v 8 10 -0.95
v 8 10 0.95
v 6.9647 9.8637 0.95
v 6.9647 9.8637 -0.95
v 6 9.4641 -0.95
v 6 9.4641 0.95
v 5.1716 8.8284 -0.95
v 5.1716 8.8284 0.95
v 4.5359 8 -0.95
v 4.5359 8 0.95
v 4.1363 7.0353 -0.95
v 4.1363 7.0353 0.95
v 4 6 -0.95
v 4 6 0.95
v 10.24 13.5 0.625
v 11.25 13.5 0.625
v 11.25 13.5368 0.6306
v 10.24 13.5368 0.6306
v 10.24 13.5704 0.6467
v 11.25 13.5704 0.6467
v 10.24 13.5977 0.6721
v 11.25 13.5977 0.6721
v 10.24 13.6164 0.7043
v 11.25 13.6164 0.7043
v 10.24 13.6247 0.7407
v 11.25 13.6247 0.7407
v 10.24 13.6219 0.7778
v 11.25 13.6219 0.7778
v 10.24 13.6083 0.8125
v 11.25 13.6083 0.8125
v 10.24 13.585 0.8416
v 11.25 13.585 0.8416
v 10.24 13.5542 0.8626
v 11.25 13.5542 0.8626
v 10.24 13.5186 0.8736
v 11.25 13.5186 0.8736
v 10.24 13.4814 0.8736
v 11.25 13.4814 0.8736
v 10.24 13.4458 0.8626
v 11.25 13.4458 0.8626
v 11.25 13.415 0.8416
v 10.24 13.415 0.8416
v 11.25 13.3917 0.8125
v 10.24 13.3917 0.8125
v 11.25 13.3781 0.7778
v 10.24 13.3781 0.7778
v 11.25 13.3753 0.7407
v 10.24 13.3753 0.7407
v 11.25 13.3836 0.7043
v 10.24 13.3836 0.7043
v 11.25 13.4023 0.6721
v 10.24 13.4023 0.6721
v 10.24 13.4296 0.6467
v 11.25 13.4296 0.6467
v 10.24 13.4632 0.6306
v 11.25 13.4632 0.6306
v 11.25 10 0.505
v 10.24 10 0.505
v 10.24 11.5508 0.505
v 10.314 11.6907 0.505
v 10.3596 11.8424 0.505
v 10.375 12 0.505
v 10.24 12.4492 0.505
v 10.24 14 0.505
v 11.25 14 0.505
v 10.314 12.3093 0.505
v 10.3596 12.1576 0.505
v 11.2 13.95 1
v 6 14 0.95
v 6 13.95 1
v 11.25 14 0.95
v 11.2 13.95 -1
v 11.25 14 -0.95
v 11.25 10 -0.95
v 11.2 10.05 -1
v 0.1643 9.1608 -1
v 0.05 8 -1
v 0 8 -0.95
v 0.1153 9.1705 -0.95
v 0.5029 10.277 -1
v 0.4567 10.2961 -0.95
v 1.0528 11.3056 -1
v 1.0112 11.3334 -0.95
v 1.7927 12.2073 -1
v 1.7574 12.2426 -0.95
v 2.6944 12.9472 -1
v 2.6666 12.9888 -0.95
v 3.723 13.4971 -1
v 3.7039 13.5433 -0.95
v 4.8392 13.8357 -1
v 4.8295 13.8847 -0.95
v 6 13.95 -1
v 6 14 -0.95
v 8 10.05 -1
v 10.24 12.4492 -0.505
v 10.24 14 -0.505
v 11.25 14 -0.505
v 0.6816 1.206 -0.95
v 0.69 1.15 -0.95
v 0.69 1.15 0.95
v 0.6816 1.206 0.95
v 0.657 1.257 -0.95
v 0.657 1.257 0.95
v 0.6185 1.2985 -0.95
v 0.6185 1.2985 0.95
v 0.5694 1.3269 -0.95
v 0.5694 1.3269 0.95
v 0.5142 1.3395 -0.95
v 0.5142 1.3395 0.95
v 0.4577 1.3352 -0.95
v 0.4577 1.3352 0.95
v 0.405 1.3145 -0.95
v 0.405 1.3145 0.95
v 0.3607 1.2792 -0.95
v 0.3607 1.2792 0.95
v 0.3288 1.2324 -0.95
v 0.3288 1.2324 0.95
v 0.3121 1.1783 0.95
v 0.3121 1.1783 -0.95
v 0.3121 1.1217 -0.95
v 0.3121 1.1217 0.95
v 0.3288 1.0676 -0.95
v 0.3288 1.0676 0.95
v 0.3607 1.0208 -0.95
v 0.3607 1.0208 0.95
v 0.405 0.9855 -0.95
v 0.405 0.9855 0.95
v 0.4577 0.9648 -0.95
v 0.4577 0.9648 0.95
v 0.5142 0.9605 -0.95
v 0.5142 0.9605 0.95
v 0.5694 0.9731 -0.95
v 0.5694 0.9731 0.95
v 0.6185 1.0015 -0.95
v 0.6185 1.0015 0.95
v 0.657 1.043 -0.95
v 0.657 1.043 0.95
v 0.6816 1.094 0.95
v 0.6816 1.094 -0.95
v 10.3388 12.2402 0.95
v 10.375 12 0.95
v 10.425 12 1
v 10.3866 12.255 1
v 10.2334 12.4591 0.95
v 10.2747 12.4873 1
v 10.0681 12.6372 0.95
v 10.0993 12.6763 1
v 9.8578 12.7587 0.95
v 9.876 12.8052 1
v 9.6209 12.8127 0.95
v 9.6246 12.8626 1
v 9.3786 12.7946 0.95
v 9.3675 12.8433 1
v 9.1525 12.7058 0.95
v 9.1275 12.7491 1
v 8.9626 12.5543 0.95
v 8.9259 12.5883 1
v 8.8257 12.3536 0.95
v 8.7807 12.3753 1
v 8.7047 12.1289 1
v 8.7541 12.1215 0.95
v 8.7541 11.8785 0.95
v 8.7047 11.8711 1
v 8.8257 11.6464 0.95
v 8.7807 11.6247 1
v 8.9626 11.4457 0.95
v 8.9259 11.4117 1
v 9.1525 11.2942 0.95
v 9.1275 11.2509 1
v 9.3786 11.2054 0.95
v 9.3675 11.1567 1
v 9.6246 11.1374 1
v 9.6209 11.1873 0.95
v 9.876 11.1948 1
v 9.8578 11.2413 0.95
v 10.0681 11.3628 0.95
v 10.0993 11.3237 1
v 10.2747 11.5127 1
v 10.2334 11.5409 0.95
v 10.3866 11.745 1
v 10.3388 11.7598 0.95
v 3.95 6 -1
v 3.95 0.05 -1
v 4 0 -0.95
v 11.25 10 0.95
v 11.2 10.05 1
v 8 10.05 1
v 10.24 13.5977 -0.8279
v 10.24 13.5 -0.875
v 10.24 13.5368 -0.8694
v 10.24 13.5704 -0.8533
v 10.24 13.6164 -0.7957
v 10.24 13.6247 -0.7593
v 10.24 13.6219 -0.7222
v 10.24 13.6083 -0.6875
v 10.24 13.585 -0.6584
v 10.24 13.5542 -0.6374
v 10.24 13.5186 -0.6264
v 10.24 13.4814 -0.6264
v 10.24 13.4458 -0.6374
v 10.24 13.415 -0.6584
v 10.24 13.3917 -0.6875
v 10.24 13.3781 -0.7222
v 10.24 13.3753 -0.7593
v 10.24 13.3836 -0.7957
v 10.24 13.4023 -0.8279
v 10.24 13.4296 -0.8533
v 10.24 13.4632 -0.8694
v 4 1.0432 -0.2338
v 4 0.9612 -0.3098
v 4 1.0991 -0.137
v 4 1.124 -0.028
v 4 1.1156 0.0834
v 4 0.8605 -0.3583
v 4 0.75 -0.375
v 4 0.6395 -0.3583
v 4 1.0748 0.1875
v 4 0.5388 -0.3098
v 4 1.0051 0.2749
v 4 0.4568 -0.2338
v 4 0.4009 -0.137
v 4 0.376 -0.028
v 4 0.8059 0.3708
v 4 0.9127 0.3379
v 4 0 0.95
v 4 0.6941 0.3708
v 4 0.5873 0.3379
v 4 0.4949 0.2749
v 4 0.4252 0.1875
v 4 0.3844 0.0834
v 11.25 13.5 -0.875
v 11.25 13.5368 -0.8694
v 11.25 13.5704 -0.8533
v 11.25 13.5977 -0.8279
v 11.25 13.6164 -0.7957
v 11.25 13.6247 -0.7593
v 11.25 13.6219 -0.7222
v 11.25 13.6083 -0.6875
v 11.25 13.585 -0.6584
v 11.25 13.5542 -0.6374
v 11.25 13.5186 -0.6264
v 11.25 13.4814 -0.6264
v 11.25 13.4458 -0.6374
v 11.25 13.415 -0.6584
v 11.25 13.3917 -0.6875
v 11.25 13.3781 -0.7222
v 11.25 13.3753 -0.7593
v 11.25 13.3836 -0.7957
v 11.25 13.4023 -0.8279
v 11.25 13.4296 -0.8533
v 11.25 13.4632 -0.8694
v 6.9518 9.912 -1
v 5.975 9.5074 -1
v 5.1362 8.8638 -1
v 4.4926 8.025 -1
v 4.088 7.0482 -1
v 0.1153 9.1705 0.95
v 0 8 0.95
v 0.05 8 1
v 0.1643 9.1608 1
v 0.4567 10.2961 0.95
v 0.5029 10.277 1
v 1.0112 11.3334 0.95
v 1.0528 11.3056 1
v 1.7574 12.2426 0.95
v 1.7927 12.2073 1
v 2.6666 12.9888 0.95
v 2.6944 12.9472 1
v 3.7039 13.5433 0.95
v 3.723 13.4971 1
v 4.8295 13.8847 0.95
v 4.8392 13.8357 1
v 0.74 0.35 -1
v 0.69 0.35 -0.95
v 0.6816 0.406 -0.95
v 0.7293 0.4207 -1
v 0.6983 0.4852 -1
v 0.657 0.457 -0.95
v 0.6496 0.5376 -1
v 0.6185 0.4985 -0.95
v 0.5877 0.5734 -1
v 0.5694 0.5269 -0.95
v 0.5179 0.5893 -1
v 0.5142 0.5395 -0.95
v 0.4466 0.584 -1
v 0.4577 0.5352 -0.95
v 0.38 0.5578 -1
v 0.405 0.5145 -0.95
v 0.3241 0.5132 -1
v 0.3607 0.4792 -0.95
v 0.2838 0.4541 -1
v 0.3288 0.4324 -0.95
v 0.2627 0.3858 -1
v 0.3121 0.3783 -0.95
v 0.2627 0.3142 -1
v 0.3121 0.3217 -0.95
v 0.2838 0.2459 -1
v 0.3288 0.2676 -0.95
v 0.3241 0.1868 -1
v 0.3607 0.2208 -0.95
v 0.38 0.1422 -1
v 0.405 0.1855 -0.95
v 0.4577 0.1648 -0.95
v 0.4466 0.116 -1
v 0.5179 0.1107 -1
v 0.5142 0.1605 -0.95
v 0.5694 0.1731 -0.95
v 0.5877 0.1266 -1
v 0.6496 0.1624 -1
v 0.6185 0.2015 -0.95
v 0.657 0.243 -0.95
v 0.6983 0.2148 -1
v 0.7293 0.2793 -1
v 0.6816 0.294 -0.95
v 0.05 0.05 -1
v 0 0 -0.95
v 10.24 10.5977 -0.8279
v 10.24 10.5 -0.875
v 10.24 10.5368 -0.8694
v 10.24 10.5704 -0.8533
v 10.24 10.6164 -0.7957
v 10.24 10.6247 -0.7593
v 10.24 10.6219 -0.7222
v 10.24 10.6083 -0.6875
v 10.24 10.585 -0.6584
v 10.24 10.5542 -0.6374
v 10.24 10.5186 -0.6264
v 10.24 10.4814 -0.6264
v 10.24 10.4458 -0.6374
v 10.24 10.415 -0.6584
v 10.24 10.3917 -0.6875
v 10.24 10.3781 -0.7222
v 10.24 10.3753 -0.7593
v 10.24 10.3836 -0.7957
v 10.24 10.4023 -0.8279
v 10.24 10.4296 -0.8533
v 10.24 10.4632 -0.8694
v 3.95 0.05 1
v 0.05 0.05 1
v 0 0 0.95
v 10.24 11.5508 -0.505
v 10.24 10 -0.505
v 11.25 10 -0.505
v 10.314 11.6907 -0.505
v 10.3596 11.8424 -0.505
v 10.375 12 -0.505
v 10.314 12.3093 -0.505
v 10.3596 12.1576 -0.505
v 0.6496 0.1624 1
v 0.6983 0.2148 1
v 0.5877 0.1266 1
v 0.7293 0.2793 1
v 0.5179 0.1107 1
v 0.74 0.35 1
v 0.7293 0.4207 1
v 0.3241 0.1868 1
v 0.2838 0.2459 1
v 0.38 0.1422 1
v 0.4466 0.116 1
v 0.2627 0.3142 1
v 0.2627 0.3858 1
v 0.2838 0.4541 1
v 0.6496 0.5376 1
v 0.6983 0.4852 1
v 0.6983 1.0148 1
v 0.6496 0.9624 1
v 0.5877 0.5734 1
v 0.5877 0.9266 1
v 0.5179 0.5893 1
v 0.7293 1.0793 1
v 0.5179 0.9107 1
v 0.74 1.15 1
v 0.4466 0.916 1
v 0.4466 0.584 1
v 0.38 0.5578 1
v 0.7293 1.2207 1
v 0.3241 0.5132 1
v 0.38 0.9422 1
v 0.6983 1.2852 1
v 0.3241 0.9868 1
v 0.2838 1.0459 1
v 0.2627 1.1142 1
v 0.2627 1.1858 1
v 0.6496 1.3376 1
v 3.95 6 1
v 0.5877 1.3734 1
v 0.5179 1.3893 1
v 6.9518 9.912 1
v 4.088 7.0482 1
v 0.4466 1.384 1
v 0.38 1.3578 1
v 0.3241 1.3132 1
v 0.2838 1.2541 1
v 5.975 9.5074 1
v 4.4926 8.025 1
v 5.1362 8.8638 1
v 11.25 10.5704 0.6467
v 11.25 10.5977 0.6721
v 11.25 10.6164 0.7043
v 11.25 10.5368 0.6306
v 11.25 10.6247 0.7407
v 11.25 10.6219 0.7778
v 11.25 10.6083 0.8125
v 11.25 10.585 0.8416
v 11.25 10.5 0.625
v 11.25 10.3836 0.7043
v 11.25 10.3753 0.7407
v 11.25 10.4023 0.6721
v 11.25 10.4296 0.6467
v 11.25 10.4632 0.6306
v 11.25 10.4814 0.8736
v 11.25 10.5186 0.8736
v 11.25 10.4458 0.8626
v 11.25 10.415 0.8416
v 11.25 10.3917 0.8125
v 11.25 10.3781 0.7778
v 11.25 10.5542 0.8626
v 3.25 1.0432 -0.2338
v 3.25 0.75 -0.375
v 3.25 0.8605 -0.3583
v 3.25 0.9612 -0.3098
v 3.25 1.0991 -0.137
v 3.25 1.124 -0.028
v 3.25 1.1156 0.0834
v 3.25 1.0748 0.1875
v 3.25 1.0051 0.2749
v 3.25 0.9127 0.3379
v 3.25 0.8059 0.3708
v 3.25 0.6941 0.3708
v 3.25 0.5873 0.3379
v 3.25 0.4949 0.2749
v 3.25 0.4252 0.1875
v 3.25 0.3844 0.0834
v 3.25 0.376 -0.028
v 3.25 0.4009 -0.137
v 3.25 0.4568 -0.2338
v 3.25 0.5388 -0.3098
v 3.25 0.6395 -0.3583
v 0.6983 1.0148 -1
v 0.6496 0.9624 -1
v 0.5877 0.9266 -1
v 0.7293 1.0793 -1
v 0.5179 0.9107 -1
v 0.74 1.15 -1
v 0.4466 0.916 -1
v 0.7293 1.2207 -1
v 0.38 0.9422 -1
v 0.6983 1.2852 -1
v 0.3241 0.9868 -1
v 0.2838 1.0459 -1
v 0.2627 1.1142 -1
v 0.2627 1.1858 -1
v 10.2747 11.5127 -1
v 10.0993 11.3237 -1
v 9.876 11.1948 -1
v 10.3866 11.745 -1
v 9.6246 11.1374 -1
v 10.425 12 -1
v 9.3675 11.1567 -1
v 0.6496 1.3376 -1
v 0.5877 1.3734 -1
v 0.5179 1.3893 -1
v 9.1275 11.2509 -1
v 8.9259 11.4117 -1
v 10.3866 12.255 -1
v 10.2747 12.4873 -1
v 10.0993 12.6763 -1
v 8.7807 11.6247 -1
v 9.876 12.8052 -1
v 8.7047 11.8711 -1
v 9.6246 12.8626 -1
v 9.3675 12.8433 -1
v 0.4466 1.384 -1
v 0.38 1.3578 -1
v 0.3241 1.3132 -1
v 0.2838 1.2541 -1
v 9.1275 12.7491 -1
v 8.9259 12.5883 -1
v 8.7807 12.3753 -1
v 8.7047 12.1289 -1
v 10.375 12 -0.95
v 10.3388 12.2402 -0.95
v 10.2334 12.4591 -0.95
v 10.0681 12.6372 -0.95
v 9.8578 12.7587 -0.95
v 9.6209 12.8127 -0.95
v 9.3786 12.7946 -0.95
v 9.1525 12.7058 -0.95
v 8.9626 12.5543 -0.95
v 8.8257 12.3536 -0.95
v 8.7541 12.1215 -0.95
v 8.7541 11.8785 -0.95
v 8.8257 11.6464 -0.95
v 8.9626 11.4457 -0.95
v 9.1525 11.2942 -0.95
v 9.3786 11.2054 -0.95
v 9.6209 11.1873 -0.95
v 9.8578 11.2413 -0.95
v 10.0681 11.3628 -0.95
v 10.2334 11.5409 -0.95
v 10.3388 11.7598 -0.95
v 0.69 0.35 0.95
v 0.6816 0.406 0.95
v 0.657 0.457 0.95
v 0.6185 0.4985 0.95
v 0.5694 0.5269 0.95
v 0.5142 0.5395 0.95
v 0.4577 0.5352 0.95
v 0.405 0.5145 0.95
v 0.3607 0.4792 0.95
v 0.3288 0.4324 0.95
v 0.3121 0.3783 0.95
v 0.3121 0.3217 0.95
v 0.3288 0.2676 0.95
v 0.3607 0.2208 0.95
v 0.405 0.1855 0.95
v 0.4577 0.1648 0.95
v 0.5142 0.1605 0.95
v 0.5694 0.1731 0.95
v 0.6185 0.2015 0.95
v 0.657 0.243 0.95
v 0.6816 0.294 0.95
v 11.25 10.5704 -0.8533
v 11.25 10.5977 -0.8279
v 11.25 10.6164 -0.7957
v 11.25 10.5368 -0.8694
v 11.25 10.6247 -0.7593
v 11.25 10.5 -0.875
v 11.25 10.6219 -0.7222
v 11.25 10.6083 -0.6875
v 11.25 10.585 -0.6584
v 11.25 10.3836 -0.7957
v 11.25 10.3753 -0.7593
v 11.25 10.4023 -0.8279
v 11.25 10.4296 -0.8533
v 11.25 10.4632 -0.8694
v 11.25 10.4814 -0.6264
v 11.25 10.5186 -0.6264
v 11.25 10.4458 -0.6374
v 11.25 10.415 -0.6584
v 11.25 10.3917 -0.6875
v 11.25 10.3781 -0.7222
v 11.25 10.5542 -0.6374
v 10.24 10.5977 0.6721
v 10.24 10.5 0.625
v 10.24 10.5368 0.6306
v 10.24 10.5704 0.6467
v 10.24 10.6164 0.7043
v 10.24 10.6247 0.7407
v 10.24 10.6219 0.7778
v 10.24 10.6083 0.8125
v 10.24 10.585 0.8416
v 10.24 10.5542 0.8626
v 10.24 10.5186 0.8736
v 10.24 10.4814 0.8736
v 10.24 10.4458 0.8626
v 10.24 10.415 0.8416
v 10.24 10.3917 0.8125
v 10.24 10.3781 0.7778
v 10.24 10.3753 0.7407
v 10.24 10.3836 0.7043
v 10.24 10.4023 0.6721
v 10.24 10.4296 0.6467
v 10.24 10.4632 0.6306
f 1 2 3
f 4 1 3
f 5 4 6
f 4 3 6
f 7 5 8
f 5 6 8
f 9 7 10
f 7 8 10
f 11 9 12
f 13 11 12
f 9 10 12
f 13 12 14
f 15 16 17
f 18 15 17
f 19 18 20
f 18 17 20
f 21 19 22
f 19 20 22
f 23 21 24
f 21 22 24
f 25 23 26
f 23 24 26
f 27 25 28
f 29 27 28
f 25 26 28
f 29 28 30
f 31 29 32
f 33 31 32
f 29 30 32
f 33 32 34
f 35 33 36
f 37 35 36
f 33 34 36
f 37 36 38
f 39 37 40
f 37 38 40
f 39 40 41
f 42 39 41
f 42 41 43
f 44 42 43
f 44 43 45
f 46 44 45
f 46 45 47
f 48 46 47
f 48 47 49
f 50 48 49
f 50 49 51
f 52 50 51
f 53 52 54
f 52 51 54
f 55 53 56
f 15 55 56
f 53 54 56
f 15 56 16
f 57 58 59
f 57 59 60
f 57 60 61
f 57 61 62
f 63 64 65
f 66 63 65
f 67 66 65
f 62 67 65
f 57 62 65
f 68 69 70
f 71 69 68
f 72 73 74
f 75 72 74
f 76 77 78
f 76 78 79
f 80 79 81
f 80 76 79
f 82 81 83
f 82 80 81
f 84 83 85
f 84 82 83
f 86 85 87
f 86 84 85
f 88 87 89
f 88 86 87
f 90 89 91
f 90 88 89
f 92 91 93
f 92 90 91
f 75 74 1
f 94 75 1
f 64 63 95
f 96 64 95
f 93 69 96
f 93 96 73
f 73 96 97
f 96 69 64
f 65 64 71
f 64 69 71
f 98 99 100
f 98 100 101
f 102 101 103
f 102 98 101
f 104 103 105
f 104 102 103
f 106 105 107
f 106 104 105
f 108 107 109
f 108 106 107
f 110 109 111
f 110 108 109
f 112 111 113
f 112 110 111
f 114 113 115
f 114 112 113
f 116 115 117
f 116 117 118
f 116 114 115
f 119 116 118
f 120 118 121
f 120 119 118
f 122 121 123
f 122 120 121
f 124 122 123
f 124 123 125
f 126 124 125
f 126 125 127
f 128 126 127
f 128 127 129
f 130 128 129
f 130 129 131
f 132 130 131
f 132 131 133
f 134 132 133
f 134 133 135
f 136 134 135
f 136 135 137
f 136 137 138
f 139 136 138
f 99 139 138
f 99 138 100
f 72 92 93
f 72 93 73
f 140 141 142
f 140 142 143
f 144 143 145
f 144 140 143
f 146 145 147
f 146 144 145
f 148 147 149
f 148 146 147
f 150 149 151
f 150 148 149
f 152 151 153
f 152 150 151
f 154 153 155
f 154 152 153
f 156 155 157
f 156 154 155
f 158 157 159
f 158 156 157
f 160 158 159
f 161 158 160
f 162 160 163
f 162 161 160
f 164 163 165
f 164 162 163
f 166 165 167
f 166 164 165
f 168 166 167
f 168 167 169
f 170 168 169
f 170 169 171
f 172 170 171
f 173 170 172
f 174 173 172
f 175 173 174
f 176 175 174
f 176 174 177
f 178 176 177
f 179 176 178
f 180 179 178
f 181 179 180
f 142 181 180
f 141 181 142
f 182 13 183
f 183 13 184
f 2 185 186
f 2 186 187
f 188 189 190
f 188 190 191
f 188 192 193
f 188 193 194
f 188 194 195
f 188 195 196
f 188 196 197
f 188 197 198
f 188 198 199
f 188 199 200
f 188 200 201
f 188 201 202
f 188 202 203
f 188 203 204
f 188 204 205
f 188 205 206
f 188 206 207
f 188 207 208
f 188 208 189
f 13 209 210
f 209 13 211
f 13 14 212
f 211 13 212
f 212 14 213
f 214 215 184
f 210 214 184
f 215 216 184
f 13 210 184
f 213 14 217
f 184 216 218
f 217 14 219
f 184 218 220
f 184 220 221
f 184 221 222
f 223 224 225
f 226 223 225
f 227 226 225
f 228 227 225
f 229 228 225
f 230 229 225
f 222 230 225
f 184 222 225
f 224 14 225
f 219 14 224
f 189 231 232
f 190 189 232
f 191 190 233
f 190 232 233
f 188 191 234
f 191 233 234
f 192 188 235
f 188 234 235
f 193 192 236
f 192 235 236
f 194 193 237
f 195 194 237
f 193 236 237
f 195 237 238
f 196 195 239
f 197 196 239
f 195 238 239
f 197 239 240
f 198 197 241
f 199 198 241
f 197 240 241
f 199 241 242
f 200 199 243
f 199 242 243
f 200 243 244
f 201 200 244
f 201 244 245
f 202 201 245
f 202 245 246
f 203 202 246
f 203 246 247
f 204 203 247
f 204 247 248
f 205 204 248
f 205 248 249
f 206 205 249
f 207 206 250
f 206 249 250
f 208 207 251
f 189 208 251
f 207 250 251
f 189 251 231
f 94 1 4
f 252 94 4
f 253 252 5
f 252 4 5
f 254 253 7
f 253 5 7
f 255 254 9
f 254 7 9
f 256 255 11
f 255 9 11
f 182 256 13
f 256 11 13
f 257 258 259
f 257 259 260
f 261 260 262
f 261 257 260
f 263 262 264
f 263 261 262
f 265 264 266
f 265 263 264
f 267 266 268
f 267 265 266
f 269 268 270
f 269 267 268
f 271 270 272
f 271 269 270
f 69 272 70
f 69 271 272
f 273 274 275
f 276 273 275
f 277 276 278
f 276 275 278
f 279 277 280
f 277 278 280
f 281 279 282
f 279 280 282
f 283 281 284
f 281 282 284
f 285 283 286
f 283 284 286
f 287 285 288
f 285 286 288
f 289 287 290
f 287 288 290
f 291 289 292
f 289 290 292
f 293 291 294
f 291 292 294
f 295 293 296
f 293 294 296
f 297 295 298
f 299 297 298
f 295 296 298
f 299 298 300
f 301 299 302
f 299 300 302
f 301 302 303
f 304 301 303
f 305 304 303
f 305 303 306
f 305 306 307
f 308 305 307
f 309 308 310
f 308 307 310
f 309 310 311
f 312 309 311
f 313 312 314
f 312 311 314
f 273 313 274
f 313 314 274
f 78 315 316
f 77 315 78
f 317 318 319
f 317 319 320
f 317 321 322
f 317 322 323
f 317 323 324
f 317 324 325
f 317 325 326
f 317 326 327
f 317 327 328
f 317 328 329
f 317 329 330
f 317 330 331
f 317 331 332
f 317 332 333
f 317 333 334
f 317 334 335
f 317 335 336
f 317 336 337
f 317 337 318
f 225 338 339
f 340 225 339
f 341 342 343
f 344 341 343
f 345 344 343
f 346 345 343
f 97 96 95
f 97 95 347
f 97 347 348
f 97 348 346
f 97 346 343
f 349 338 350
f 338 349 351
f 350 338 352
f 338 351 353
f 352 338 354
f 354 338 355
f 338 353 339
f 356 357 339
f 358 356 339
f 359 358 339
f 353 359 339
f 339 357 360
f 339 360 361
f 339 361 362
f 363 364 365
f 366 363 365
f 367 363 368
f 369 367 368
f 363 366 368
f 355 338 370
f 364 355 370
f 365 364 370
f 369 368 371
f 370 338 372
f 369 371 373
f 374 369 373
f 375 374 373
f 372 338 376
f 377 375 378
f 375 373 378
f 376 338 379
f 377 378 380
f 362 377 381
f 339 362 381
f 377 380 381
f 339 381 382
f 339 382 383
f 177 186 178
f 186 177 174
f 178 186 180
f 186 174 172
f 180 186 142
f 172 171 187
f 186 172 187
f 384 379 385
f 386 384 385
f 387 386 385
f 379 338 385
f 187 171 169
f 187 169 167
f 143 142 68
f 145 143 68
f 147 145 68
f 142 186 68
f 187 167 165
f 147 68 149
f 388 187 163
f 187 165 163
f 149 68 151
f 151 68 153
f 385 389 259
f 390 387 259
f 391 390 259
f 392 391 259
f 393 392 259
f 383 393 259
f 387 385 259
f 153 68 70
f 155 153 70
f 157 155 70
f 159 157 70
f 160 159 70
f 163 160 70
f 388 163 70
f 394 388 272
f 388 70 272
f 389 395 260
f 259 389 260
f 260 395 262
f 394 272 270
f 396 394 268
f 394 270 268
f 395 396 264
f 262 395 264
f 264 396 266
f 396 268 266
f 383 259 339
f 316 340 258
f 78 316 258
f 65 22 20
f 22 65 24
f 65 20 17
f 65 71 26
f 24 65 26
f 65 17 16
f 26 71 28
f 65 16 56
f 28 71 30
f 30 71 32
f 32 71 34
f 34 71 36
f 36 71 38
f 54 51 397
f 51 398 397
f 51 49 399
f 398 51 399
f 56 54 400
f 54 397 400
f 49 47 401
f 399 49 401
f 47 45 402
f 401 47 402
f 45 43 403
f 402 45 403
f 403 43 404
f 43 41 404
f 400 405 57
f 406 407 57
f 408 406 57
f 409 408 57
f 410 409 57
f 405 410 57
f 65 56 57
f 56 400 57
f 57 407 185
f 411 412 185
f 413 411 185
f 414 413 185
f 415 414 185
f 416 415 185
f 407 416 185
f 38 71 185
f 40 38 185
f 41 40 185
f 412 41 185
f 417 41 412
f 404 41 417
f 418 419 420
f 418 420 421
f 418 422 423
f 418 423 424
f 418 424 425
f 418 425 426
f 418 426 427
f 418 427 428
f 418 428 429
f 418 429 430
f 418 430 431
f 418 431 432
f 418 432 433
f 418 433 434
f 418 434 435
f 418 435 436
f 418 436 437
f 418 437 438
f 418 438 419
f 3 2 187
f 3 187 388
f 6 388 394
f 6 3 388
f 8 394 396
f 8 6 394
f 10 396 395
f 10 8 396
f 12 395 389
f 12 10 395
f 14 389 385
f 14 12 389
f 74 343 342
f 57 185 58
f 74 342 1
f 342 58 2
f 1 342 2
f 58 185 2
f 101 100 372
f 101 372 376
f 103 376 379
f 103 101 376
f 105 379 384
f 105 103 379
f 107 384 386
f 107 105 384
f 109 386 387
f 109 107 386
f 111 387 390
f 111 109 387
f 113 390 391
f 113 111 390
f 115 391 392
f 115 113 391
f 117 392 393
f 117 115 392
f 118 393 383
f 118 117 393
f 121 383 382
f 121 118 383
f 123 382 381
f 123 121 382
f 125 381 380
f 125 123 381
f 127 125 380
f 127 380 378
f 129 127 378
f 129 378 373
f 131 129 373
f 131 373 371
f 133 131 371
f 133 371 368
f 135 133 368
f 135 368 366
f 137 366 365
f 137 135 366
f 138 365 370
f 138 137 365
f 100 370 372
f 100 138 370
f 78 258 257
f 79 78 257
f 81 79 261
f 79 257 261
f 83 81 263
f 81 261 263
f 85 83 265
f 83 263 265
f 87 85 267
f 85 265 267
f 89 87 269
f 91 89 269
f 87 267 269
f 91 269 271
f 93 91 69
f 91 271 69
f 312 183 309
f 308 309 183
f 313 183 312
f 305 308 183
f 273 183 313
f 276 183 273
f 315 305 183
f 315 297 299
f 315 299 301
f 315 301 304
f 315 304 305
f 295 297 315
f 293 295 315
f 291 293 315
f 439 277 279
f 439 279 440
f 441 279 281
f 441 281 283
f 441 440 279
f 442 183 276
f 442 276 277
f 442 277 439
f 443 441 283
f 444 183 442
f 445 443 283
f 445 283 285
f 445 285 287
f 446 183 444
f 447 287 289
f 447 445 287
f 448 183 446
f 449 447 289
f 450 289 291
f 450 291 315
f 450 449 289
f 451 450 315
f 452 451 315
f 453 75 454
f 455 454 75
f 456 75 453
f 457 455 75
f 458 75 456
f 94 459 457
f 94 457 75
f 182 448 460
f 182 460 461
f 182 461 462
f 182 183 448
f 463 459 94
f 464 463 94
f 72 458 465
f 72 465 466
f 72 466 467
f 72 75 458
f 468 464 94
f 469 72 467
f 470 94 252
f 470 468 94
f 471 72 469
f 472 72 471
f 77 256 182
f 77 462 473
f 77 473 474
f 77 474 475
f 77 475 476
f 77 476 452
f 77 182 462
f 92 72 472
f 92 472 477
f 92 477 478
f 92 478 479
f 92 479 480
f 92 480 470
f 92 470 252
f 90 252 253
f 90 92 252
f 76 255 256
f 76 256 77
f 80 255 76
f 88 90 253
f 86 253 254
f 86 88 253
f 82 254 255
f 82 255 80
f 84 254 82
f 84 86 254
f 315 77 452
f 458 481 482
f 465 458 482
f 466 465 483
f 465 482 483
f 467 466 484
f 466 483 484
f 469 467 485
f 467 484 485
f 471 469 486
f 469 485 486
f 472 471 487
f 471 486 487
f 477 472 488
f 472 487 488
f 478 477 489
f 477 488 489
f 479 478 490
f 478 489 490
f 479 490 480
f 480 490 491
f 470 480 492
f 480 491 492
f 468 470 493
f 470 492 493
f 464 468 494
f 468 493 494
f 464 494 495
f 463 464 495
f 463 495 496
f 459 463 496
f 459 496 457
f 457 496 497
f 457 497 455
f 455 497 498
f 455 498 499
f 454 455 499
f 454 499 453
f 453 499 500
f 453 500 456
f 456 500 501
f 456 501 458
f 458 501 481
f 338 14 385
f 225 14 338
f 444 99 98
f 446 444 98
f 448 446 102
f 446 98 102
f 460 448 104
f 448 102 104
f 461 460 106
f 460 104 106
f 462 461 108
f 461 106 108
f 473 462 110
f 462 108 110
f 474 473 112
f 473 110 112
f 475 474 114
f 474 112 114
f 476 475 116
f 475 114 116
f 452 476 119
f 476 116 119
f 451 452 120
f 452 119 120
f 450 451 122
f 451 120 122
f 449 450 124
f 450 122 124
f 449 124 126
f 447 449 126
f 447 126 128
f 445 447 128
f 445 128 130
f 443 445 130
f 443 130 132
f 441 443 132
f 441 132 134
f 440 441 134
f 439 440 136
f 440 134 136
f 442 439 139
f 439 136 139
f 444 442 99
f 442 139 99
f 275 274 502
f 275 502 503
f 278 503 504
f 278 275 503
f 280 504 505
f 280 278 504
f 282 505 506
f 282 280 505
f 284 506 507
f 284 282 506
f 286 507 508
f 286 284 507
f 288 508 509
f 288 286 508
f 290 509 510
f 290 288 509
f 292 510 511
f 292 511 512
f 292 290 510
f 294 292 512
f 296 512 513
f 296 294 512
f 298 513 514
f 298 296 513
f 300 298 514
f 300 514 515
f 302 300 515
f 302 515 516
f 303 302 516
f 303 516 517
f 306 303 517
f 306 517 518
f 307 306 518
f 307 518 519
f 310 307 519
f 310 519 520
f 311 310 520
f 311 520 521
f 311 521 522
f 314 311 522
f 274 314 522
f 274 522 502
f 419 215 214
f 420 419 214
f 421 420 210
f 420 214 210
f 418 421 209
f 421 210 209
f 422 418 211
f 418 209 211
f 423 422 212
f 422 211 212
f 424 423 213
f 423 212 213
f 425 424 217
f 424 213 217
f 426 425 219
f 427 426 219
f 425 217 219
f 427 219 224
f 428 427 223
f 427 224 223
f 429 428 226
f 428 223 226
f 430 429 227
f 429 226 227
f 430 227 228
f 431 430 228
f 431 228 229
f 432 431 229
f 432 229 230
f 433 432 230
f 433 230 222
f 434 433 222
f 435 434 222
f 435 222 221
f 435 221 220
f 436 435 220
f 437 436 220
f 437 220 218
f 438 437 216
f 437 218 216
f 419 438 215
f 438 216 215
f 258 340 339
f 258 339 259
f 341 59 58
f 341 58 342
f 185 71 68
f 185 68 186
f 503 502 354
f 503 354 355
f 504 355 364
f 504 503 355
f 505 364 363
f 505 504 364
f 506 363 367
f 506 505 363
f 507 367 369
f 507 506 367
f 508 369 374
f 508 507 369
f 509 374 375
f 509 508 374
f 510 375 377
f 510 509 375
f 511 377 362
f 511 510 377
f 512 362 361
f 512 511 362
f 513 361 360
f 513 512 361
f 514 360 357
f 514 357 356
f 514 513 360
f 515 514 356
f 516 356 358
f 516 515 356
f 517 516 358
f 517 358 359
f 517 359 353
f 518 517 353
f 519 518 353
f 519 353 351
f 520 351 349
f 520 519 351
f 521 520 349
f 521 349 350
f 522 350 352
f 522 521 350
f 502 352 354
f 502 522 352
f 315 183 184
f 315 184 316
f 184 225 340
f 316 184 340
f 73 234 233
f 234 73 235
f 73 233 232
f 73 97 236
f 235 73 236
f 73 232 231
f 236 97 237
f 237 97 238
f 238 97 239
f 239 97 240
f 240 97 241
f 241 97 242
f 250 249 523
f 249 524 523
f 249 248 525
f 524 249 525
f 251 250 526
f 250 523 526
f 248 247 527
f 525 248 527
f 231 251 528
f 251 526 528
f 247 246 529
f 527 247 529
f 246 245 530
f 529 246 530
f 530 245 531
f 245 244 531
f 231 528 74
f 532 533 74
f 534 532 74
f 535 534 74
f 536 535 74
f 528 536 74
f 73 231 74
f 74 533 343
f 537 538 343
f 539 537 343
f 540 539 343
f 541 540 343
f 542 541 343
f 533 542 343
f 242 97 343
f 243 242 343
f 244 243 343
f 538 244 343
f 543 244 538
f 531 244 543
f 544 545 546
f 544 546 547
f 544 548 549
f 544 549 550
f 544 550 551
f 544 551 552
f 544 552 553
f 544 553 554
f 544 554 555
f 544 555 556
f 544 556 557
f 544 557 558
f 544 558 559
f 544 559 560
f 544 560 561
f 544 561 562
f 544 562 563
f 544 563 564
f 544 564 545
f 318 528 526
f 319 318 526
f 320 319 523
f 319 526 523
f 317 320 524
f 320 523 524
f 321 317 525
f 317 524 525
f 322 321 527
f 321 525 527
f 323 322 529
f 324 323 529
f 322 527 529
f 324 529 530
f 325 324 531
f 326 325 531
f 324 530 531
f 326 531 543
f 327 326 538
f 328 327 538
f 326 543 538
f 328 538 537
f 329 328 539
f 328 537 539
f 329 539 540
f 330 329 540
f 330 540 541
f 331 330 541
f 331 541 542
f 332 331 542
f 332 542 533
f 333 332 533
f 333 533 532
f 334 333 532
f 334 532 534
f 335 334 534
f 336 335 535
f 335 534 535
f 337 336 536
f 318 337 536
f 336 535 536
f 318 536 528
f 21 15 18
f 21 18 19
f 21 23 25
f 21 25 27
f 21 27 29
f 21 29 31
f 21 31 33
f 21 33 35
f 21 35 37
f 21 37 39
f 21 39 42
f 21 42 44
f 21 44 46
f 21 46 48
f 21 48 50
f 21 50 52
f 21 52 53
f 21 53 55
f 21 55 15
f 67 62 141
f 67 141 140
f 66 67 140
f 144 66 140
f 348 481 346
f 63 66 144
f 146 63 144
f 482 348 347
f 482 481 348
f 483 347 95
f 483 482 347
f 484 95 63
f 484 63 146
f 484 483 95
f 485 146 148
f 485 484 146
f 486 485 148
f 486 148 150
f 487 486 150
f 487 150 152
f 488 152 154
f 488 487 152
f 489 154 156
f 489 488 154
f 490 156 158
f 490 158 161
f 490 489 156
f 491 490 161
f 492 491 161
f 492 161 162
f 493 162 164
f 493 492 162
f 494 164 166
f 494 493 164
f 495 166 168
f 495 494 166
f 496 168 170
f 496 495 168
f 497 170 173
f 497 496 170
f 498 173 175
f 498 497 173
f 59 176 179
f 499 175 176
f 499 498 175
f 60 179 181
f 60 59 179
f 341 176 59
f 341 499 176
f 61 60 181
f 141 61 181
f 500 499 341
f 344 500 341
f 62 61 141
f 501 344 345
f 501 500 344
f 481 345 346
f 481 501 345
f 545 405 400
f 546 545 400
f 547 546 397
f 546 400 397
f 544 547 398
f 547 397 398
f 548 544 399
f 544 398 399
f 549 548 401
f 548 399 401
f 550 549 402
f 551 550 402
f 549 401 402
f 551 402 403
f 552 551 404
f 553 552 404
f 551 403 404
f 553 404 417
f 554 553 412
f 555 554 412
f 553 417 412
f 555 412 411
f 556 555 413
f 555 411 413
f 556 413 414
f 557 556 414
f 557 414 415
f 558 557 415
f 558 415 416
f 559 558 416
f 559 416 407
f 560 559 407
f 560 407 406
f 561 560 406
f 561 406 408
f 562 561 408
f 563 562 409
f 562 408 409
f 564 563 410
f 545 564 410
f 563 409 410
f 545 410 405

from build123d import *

# Parameters (mm, degrees)
SKETCH1_R           = 0.19
SKETCH1_R_2         = 0.815
BOSS_EXTRUDE1_DEPTH = 1
SKETCH2_R           = 0.375
CUT_EXTRUDE1_DEPTH  = 0.75
SKETCH3_W           = 1.01
SKETCH3_H           = 1.01
CUT_EXTRUDE2_DEPTH  = 15
SKETCH4_R           = 0.125
CUT_EXTRUDE3_DEPTH  = 1.01
CHAMFER1_SIZE       = 0.05


with BuildPart() as part:
    # Sketch1 → Boss-Extrude1 (new body, symmetric)
    with BuildSketch(Plane.XY):
        with BuildLine():
            Line((0, 0), (0, 8))
            ThreePointArc((0, 8), (1.757359313, 12.242640687), (6, 14))
            Line((6, 14), (11.25, 14))
            Line((11.25, 14), (11.25, 10))
            Line((11.25, 10), (8, 10))
            ThreePointArc((8, 10), (5.171572875, 8.828427125), (4, 6))
            Line((4, 6), (4, 0))
            Line((4, 0), (0, 0))
        make_face()
        with Locations((0.5, 0.35)):
            Circle(SKETCH1_R, mode=Mode.SUBTRACT)
        with Locations((0.5, 1.15)):
            Circle(SKETCH1_R, mode=Mode.SUBTRACT)
        with Locations((9.56, 12)):
            Circle(SKETCH1_R_2, mode=Mode.SUBTRACT)
    extrude(amount=BOSS_EXTRUDE1_DEPTH, both=True)

    # Sketch2 → Cut-Extrude1 (cut)
    with BuildSketch(Plane(origin=(4, 0, 0), x_dir=(0, 0, -1), z_dir=(1, 0, 0))):
        with Locations((0, 0.75)):
            Circle(SKETCH2_R)
    extrude(amount=-CUT_EXTRUDE1_DEPTH, mode=Mode.SUBTRACT)

    # Sketch3 → Cut-Extrude2 (cut, through all)
    with BuildSketch(Plane(origin=(0, 14, 0), x_dir=(1, 0, 0), z_dir=(0, 1, 0))):
        with Locations((10.745, 0)):
            Rectangle(SKETCH3_W, SKETCH3_H)
    extrude(amount=-CUT_EXTRUDE2_DEPTH, mode=Mode.SUBTRACT)

    # Sketch4 → Cut-Extrude3 (cut)
    with BuildSketch(Plane(origin=(11.25, 0, 0), x_dir=(0, 0, -1), z_dir=(1, 0, 0))):
        with Locations((0.75, 13.5)):
            Circle(SKETCH4_R)
        with Locations((0.75, 10.5)):
            Circle(SKETCH4_R)
        with Locations((-0.75, 10.5)):
            Circle(SKETCH4_R)
        with Locations((-0.75, 13.5)):
            Circle(SKETCH4_R)
    extrude(amount=-CUT_EXTRUDE3_DEPTH, mode=Mode.SUBTRACT)

    # Chamfer1
    chamfer1_edges = [part.edges().sort_by_distance(p)[0] for p in [
        (9.625, 10, -1),
        (5.171572875, 8.828427125, -1),
        (4, 3, -1),
        (2, 0, -1),
        (5.171572875, 8.828427125, 1),
        (9.625, 10, 1),
        (11.25, 12, 1),
        (0.31, 0.35, -1),
        (0.31, 0.35, 1),
        (8.625, 14, 1),
        (0.31, 1.15, -1),
        (0.31, 1.15, 1),
        (1.757359313, 12.242640687, 1),
        (8.745, 12, -1),
        (8.745, 12, 1),
        (0, 4, 1),
        (2, 0, 1),
        (0, 4, -1),
        (4, 3, 1),
        (1.757359313, 12.242640687, -1),
        (8.625, 14, -1),
        (11.25, 12, -1),
    ]]
    chamfer(chamfer1_edges, length=CHAMFER1_SIZE)


solid = part.part
